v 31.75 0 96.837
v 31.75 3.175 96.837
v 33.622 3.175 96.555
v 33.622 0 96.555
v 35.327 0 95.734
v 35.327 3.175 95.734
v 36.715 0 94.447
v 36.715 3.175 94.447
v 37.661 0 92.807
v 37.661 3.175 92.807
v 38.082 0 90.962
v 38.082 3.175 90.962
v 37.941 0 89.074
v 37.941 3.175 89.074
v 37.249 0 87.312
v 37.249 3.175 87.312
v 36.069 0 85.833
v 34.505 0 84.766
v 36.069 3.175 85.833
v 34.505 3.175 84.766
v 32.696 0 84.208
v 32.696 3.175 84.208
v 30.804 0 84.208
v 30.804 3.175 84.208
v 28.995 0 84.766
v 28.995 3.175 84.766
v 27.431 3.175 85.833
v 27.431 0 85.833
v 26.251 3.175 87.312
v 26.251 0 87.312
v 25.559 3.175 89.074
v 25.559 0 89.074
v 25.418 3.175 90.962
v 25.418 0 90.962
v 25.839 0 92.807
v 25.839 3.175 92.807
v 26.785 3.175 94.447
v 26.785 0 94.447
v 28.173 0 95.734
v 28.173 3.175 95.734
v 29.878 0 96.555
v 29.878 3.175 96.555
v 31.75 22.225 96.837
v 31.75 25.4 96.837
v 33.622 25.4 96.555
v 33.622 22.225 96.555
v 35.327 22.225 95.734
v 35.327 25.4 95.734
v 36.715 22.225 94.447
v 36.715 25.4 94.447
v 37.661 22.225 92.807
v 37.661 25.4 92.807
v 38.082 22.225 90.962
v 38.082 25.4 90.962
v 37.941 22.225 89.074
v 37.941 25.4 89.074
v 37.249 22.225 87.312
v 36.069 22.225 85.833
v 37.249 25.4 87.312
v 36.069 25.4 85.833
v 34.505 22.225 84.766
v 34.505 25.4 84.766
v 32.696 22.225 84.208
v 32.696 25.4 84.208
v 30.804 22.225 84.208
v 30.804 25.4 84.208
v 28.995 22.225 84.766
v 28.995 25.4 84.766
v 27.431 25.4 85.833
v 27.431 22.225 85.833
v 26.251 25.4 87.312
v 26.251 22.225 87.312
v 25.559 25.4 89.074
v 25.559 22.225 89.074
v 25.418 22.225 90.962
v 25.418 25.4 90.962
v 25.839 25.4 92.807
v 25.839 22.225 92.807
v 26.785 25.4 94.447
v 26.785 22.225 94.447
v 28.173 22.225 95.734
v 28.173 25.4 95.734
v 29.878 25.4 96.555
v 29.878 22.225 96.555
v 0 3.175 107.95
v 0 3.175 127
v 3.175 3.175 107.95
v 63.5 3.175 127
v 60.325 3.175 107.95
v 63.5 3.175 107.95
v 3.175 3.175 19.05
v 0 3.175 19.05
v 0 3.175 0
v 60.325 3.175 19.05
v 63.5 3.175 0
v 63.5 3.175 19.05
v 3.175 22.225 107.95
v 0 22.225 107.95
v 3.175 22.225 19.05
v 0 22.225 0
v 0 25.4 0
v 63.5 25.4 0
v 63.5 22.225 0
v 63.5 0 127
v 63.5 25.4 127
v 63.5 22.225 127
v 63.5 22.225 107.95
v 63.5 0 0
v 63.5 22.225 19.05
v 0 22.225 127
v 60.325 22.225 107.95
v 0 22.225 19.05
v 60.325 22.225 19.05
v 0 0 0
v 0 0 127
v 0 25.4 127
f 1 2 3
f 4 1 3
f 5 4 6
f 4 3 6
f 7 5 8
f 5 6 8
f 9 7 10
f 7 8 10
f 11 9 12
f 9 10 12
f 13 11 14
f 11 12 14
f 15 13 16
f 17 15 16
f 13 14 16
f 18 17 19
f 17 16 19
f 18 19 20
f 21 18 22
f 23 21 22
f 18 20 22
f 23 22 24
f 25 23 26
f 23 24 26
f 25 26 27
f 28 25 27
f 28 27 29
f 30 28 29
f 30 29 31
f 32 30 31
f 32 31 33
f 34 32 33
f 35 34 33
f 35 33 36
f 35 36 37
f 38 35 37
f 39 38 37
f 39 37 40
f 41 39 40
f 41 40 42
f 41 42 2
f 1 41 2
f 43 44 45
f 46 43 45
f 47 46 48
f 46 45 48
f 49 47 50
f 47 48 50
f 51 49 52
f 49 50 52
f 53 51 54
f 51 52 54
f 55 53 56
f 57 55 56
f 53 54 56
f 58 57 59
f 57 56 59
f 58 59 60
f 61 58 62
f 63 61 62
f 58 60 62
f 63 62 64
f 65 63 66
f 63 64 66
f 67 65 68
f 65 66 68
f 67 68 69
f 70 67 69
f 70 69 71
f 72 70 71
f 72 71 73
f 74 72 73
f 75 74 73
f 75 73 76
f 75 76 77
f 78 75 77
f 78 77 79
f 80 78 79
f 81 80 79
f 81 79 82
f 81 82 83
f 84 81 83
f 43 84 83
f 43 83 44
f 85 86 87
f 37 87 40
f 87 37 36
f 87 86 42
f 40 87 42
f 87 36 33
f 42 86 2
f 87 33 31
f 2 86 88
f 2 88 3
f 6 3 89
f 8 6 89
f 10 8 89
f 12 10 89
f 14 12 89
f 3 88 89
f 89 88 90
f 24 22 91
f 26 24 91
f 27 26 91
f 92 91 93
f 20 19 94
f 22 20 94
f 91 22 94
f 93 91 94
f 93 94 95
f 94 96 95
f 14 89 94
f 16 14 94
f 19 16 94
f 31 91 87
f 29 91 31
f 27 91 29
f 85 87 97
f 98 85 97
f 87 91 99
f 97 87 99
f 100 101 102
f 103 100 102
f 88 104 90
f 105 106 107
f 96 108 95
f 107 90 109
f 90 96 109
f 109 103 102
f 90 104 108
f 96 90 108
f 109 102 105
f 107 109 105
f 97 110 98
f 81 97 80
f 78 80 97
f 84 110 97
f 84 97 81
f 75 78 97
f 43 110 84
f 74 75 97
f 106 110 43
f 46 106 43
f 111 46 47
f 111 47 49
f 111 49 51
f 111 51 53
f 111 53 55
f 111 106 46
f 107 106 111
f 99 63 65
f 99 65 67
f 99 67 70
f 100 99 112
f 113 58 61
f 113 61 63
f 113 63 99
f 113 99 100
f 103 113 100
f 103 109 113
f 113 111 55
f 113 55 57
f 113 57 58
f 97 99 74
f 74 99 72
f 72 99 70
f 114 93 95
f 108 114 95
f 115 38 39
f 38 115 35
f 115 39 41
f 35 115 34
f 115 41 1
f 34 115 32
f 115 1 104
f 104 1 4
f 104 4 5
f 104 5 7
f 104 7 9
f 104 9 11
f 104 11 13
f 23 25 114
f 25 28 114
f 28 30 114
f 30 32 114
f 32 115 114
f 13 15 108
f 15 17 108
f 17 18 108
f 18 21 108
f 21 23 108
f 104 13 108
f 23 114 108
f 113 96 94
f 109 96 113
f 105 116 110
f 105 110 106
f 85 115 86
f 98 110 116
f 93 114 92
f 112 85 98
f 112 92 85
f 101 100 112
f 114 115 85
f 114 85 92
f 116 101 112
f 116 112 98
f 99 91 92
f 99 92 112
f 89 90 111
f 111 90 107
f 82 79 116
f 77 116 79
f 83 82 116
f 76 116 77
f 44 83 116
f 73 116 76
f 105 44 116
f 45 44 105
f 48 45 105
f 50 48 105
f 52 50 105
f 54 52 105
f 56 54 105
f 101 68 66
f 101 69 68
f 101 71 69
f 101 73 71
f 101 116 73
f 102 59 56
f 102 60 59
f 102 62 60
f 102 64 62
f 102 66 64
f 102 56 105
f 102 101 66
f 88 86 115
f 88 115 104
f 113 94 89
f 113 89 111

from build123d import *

# Parameters (mm, degrees)
SKETCH1_W           = 63.5
SKETCH1_H           = 25.4
SKETCH1_W_2         = 57.15
SKETCH1_H_2         = 19.05
EXTRUDE_THIN1_DEPTH = 127
SKETCH2_W           = 19.05
SKETCH2_H           = 19.05
CUT_EXTRUDE1_DEPTH  = 145.244271983
SKETCH3_W           = 19.05
SKETCH3_H           = 19.05
CUT_EXTRUDE2_DEPTH  = 145.244271983
SKETCH4_R           = 6.35
CUT_EXTRUDE3_DEPTH  = 145.244271983


with BuildPart() as part:
    # Sketch1 → Extrude-Thin1 (new body)
    with BuildSketch(Plane.XY):
        with Locations((31.75, 12.7)):
            Rectangle(SKETCH1_W, SKETCH1_H)
        with Locations((31.75, 12.7)):
            Rectangle(SKETCH1_W_2, SKETCH1_H_2, mode=Mode.SUBTRACT)
    extrude(amount=EXTRUDE_THIN1_DEPTH)

    # Sketch2 → Cut-Extrude1 (cut, through all)
    with BuildSketch(Plane(origin=(63.5, 0, 0), x_dir=(0, 0, -1), z_dir=(1, 0, 0))):
        with Locations((-9.525, 12.7)):
            Rectangle(SKETCH2_W, SKETCH2_H)
    extrude(amount=-CUT_EXTRUDE1_DEPTH, mode=Mode.SUBTRACT)

    # Sketch3 → Cut-Extrude2 (cut, through all)
    with BuildSketch(Plane(origin=(63.5, 0, 0), x_dir=(0, 0, -1), z_dir=(1, 0, 0))):
        with Locations((-117.475, 12.7)):
            Rectangle(SKETCH3_W, SKETCH3_H)
    extrude(amount=-CUT_EXTRUDE2_DEPTH, mode=Mode.SUBTRACT)

    # Sketch4 → Cut-Extrude3 (cut, through all)
    with BuildSketch(Plane(origin=(0, 25.4, 0), x_dir=(1, 0, 0), z_dir=(0, 1, 0))):
        with Locations(Location((31.75, -90.4875, 0), (0, 0, 270))):
            Circle(SKETCH4_R)
    extrude(amount=-CUT_EXTRUDE3_DEPTH, mode=Mode.SUBTRACT)


solid = part.part
